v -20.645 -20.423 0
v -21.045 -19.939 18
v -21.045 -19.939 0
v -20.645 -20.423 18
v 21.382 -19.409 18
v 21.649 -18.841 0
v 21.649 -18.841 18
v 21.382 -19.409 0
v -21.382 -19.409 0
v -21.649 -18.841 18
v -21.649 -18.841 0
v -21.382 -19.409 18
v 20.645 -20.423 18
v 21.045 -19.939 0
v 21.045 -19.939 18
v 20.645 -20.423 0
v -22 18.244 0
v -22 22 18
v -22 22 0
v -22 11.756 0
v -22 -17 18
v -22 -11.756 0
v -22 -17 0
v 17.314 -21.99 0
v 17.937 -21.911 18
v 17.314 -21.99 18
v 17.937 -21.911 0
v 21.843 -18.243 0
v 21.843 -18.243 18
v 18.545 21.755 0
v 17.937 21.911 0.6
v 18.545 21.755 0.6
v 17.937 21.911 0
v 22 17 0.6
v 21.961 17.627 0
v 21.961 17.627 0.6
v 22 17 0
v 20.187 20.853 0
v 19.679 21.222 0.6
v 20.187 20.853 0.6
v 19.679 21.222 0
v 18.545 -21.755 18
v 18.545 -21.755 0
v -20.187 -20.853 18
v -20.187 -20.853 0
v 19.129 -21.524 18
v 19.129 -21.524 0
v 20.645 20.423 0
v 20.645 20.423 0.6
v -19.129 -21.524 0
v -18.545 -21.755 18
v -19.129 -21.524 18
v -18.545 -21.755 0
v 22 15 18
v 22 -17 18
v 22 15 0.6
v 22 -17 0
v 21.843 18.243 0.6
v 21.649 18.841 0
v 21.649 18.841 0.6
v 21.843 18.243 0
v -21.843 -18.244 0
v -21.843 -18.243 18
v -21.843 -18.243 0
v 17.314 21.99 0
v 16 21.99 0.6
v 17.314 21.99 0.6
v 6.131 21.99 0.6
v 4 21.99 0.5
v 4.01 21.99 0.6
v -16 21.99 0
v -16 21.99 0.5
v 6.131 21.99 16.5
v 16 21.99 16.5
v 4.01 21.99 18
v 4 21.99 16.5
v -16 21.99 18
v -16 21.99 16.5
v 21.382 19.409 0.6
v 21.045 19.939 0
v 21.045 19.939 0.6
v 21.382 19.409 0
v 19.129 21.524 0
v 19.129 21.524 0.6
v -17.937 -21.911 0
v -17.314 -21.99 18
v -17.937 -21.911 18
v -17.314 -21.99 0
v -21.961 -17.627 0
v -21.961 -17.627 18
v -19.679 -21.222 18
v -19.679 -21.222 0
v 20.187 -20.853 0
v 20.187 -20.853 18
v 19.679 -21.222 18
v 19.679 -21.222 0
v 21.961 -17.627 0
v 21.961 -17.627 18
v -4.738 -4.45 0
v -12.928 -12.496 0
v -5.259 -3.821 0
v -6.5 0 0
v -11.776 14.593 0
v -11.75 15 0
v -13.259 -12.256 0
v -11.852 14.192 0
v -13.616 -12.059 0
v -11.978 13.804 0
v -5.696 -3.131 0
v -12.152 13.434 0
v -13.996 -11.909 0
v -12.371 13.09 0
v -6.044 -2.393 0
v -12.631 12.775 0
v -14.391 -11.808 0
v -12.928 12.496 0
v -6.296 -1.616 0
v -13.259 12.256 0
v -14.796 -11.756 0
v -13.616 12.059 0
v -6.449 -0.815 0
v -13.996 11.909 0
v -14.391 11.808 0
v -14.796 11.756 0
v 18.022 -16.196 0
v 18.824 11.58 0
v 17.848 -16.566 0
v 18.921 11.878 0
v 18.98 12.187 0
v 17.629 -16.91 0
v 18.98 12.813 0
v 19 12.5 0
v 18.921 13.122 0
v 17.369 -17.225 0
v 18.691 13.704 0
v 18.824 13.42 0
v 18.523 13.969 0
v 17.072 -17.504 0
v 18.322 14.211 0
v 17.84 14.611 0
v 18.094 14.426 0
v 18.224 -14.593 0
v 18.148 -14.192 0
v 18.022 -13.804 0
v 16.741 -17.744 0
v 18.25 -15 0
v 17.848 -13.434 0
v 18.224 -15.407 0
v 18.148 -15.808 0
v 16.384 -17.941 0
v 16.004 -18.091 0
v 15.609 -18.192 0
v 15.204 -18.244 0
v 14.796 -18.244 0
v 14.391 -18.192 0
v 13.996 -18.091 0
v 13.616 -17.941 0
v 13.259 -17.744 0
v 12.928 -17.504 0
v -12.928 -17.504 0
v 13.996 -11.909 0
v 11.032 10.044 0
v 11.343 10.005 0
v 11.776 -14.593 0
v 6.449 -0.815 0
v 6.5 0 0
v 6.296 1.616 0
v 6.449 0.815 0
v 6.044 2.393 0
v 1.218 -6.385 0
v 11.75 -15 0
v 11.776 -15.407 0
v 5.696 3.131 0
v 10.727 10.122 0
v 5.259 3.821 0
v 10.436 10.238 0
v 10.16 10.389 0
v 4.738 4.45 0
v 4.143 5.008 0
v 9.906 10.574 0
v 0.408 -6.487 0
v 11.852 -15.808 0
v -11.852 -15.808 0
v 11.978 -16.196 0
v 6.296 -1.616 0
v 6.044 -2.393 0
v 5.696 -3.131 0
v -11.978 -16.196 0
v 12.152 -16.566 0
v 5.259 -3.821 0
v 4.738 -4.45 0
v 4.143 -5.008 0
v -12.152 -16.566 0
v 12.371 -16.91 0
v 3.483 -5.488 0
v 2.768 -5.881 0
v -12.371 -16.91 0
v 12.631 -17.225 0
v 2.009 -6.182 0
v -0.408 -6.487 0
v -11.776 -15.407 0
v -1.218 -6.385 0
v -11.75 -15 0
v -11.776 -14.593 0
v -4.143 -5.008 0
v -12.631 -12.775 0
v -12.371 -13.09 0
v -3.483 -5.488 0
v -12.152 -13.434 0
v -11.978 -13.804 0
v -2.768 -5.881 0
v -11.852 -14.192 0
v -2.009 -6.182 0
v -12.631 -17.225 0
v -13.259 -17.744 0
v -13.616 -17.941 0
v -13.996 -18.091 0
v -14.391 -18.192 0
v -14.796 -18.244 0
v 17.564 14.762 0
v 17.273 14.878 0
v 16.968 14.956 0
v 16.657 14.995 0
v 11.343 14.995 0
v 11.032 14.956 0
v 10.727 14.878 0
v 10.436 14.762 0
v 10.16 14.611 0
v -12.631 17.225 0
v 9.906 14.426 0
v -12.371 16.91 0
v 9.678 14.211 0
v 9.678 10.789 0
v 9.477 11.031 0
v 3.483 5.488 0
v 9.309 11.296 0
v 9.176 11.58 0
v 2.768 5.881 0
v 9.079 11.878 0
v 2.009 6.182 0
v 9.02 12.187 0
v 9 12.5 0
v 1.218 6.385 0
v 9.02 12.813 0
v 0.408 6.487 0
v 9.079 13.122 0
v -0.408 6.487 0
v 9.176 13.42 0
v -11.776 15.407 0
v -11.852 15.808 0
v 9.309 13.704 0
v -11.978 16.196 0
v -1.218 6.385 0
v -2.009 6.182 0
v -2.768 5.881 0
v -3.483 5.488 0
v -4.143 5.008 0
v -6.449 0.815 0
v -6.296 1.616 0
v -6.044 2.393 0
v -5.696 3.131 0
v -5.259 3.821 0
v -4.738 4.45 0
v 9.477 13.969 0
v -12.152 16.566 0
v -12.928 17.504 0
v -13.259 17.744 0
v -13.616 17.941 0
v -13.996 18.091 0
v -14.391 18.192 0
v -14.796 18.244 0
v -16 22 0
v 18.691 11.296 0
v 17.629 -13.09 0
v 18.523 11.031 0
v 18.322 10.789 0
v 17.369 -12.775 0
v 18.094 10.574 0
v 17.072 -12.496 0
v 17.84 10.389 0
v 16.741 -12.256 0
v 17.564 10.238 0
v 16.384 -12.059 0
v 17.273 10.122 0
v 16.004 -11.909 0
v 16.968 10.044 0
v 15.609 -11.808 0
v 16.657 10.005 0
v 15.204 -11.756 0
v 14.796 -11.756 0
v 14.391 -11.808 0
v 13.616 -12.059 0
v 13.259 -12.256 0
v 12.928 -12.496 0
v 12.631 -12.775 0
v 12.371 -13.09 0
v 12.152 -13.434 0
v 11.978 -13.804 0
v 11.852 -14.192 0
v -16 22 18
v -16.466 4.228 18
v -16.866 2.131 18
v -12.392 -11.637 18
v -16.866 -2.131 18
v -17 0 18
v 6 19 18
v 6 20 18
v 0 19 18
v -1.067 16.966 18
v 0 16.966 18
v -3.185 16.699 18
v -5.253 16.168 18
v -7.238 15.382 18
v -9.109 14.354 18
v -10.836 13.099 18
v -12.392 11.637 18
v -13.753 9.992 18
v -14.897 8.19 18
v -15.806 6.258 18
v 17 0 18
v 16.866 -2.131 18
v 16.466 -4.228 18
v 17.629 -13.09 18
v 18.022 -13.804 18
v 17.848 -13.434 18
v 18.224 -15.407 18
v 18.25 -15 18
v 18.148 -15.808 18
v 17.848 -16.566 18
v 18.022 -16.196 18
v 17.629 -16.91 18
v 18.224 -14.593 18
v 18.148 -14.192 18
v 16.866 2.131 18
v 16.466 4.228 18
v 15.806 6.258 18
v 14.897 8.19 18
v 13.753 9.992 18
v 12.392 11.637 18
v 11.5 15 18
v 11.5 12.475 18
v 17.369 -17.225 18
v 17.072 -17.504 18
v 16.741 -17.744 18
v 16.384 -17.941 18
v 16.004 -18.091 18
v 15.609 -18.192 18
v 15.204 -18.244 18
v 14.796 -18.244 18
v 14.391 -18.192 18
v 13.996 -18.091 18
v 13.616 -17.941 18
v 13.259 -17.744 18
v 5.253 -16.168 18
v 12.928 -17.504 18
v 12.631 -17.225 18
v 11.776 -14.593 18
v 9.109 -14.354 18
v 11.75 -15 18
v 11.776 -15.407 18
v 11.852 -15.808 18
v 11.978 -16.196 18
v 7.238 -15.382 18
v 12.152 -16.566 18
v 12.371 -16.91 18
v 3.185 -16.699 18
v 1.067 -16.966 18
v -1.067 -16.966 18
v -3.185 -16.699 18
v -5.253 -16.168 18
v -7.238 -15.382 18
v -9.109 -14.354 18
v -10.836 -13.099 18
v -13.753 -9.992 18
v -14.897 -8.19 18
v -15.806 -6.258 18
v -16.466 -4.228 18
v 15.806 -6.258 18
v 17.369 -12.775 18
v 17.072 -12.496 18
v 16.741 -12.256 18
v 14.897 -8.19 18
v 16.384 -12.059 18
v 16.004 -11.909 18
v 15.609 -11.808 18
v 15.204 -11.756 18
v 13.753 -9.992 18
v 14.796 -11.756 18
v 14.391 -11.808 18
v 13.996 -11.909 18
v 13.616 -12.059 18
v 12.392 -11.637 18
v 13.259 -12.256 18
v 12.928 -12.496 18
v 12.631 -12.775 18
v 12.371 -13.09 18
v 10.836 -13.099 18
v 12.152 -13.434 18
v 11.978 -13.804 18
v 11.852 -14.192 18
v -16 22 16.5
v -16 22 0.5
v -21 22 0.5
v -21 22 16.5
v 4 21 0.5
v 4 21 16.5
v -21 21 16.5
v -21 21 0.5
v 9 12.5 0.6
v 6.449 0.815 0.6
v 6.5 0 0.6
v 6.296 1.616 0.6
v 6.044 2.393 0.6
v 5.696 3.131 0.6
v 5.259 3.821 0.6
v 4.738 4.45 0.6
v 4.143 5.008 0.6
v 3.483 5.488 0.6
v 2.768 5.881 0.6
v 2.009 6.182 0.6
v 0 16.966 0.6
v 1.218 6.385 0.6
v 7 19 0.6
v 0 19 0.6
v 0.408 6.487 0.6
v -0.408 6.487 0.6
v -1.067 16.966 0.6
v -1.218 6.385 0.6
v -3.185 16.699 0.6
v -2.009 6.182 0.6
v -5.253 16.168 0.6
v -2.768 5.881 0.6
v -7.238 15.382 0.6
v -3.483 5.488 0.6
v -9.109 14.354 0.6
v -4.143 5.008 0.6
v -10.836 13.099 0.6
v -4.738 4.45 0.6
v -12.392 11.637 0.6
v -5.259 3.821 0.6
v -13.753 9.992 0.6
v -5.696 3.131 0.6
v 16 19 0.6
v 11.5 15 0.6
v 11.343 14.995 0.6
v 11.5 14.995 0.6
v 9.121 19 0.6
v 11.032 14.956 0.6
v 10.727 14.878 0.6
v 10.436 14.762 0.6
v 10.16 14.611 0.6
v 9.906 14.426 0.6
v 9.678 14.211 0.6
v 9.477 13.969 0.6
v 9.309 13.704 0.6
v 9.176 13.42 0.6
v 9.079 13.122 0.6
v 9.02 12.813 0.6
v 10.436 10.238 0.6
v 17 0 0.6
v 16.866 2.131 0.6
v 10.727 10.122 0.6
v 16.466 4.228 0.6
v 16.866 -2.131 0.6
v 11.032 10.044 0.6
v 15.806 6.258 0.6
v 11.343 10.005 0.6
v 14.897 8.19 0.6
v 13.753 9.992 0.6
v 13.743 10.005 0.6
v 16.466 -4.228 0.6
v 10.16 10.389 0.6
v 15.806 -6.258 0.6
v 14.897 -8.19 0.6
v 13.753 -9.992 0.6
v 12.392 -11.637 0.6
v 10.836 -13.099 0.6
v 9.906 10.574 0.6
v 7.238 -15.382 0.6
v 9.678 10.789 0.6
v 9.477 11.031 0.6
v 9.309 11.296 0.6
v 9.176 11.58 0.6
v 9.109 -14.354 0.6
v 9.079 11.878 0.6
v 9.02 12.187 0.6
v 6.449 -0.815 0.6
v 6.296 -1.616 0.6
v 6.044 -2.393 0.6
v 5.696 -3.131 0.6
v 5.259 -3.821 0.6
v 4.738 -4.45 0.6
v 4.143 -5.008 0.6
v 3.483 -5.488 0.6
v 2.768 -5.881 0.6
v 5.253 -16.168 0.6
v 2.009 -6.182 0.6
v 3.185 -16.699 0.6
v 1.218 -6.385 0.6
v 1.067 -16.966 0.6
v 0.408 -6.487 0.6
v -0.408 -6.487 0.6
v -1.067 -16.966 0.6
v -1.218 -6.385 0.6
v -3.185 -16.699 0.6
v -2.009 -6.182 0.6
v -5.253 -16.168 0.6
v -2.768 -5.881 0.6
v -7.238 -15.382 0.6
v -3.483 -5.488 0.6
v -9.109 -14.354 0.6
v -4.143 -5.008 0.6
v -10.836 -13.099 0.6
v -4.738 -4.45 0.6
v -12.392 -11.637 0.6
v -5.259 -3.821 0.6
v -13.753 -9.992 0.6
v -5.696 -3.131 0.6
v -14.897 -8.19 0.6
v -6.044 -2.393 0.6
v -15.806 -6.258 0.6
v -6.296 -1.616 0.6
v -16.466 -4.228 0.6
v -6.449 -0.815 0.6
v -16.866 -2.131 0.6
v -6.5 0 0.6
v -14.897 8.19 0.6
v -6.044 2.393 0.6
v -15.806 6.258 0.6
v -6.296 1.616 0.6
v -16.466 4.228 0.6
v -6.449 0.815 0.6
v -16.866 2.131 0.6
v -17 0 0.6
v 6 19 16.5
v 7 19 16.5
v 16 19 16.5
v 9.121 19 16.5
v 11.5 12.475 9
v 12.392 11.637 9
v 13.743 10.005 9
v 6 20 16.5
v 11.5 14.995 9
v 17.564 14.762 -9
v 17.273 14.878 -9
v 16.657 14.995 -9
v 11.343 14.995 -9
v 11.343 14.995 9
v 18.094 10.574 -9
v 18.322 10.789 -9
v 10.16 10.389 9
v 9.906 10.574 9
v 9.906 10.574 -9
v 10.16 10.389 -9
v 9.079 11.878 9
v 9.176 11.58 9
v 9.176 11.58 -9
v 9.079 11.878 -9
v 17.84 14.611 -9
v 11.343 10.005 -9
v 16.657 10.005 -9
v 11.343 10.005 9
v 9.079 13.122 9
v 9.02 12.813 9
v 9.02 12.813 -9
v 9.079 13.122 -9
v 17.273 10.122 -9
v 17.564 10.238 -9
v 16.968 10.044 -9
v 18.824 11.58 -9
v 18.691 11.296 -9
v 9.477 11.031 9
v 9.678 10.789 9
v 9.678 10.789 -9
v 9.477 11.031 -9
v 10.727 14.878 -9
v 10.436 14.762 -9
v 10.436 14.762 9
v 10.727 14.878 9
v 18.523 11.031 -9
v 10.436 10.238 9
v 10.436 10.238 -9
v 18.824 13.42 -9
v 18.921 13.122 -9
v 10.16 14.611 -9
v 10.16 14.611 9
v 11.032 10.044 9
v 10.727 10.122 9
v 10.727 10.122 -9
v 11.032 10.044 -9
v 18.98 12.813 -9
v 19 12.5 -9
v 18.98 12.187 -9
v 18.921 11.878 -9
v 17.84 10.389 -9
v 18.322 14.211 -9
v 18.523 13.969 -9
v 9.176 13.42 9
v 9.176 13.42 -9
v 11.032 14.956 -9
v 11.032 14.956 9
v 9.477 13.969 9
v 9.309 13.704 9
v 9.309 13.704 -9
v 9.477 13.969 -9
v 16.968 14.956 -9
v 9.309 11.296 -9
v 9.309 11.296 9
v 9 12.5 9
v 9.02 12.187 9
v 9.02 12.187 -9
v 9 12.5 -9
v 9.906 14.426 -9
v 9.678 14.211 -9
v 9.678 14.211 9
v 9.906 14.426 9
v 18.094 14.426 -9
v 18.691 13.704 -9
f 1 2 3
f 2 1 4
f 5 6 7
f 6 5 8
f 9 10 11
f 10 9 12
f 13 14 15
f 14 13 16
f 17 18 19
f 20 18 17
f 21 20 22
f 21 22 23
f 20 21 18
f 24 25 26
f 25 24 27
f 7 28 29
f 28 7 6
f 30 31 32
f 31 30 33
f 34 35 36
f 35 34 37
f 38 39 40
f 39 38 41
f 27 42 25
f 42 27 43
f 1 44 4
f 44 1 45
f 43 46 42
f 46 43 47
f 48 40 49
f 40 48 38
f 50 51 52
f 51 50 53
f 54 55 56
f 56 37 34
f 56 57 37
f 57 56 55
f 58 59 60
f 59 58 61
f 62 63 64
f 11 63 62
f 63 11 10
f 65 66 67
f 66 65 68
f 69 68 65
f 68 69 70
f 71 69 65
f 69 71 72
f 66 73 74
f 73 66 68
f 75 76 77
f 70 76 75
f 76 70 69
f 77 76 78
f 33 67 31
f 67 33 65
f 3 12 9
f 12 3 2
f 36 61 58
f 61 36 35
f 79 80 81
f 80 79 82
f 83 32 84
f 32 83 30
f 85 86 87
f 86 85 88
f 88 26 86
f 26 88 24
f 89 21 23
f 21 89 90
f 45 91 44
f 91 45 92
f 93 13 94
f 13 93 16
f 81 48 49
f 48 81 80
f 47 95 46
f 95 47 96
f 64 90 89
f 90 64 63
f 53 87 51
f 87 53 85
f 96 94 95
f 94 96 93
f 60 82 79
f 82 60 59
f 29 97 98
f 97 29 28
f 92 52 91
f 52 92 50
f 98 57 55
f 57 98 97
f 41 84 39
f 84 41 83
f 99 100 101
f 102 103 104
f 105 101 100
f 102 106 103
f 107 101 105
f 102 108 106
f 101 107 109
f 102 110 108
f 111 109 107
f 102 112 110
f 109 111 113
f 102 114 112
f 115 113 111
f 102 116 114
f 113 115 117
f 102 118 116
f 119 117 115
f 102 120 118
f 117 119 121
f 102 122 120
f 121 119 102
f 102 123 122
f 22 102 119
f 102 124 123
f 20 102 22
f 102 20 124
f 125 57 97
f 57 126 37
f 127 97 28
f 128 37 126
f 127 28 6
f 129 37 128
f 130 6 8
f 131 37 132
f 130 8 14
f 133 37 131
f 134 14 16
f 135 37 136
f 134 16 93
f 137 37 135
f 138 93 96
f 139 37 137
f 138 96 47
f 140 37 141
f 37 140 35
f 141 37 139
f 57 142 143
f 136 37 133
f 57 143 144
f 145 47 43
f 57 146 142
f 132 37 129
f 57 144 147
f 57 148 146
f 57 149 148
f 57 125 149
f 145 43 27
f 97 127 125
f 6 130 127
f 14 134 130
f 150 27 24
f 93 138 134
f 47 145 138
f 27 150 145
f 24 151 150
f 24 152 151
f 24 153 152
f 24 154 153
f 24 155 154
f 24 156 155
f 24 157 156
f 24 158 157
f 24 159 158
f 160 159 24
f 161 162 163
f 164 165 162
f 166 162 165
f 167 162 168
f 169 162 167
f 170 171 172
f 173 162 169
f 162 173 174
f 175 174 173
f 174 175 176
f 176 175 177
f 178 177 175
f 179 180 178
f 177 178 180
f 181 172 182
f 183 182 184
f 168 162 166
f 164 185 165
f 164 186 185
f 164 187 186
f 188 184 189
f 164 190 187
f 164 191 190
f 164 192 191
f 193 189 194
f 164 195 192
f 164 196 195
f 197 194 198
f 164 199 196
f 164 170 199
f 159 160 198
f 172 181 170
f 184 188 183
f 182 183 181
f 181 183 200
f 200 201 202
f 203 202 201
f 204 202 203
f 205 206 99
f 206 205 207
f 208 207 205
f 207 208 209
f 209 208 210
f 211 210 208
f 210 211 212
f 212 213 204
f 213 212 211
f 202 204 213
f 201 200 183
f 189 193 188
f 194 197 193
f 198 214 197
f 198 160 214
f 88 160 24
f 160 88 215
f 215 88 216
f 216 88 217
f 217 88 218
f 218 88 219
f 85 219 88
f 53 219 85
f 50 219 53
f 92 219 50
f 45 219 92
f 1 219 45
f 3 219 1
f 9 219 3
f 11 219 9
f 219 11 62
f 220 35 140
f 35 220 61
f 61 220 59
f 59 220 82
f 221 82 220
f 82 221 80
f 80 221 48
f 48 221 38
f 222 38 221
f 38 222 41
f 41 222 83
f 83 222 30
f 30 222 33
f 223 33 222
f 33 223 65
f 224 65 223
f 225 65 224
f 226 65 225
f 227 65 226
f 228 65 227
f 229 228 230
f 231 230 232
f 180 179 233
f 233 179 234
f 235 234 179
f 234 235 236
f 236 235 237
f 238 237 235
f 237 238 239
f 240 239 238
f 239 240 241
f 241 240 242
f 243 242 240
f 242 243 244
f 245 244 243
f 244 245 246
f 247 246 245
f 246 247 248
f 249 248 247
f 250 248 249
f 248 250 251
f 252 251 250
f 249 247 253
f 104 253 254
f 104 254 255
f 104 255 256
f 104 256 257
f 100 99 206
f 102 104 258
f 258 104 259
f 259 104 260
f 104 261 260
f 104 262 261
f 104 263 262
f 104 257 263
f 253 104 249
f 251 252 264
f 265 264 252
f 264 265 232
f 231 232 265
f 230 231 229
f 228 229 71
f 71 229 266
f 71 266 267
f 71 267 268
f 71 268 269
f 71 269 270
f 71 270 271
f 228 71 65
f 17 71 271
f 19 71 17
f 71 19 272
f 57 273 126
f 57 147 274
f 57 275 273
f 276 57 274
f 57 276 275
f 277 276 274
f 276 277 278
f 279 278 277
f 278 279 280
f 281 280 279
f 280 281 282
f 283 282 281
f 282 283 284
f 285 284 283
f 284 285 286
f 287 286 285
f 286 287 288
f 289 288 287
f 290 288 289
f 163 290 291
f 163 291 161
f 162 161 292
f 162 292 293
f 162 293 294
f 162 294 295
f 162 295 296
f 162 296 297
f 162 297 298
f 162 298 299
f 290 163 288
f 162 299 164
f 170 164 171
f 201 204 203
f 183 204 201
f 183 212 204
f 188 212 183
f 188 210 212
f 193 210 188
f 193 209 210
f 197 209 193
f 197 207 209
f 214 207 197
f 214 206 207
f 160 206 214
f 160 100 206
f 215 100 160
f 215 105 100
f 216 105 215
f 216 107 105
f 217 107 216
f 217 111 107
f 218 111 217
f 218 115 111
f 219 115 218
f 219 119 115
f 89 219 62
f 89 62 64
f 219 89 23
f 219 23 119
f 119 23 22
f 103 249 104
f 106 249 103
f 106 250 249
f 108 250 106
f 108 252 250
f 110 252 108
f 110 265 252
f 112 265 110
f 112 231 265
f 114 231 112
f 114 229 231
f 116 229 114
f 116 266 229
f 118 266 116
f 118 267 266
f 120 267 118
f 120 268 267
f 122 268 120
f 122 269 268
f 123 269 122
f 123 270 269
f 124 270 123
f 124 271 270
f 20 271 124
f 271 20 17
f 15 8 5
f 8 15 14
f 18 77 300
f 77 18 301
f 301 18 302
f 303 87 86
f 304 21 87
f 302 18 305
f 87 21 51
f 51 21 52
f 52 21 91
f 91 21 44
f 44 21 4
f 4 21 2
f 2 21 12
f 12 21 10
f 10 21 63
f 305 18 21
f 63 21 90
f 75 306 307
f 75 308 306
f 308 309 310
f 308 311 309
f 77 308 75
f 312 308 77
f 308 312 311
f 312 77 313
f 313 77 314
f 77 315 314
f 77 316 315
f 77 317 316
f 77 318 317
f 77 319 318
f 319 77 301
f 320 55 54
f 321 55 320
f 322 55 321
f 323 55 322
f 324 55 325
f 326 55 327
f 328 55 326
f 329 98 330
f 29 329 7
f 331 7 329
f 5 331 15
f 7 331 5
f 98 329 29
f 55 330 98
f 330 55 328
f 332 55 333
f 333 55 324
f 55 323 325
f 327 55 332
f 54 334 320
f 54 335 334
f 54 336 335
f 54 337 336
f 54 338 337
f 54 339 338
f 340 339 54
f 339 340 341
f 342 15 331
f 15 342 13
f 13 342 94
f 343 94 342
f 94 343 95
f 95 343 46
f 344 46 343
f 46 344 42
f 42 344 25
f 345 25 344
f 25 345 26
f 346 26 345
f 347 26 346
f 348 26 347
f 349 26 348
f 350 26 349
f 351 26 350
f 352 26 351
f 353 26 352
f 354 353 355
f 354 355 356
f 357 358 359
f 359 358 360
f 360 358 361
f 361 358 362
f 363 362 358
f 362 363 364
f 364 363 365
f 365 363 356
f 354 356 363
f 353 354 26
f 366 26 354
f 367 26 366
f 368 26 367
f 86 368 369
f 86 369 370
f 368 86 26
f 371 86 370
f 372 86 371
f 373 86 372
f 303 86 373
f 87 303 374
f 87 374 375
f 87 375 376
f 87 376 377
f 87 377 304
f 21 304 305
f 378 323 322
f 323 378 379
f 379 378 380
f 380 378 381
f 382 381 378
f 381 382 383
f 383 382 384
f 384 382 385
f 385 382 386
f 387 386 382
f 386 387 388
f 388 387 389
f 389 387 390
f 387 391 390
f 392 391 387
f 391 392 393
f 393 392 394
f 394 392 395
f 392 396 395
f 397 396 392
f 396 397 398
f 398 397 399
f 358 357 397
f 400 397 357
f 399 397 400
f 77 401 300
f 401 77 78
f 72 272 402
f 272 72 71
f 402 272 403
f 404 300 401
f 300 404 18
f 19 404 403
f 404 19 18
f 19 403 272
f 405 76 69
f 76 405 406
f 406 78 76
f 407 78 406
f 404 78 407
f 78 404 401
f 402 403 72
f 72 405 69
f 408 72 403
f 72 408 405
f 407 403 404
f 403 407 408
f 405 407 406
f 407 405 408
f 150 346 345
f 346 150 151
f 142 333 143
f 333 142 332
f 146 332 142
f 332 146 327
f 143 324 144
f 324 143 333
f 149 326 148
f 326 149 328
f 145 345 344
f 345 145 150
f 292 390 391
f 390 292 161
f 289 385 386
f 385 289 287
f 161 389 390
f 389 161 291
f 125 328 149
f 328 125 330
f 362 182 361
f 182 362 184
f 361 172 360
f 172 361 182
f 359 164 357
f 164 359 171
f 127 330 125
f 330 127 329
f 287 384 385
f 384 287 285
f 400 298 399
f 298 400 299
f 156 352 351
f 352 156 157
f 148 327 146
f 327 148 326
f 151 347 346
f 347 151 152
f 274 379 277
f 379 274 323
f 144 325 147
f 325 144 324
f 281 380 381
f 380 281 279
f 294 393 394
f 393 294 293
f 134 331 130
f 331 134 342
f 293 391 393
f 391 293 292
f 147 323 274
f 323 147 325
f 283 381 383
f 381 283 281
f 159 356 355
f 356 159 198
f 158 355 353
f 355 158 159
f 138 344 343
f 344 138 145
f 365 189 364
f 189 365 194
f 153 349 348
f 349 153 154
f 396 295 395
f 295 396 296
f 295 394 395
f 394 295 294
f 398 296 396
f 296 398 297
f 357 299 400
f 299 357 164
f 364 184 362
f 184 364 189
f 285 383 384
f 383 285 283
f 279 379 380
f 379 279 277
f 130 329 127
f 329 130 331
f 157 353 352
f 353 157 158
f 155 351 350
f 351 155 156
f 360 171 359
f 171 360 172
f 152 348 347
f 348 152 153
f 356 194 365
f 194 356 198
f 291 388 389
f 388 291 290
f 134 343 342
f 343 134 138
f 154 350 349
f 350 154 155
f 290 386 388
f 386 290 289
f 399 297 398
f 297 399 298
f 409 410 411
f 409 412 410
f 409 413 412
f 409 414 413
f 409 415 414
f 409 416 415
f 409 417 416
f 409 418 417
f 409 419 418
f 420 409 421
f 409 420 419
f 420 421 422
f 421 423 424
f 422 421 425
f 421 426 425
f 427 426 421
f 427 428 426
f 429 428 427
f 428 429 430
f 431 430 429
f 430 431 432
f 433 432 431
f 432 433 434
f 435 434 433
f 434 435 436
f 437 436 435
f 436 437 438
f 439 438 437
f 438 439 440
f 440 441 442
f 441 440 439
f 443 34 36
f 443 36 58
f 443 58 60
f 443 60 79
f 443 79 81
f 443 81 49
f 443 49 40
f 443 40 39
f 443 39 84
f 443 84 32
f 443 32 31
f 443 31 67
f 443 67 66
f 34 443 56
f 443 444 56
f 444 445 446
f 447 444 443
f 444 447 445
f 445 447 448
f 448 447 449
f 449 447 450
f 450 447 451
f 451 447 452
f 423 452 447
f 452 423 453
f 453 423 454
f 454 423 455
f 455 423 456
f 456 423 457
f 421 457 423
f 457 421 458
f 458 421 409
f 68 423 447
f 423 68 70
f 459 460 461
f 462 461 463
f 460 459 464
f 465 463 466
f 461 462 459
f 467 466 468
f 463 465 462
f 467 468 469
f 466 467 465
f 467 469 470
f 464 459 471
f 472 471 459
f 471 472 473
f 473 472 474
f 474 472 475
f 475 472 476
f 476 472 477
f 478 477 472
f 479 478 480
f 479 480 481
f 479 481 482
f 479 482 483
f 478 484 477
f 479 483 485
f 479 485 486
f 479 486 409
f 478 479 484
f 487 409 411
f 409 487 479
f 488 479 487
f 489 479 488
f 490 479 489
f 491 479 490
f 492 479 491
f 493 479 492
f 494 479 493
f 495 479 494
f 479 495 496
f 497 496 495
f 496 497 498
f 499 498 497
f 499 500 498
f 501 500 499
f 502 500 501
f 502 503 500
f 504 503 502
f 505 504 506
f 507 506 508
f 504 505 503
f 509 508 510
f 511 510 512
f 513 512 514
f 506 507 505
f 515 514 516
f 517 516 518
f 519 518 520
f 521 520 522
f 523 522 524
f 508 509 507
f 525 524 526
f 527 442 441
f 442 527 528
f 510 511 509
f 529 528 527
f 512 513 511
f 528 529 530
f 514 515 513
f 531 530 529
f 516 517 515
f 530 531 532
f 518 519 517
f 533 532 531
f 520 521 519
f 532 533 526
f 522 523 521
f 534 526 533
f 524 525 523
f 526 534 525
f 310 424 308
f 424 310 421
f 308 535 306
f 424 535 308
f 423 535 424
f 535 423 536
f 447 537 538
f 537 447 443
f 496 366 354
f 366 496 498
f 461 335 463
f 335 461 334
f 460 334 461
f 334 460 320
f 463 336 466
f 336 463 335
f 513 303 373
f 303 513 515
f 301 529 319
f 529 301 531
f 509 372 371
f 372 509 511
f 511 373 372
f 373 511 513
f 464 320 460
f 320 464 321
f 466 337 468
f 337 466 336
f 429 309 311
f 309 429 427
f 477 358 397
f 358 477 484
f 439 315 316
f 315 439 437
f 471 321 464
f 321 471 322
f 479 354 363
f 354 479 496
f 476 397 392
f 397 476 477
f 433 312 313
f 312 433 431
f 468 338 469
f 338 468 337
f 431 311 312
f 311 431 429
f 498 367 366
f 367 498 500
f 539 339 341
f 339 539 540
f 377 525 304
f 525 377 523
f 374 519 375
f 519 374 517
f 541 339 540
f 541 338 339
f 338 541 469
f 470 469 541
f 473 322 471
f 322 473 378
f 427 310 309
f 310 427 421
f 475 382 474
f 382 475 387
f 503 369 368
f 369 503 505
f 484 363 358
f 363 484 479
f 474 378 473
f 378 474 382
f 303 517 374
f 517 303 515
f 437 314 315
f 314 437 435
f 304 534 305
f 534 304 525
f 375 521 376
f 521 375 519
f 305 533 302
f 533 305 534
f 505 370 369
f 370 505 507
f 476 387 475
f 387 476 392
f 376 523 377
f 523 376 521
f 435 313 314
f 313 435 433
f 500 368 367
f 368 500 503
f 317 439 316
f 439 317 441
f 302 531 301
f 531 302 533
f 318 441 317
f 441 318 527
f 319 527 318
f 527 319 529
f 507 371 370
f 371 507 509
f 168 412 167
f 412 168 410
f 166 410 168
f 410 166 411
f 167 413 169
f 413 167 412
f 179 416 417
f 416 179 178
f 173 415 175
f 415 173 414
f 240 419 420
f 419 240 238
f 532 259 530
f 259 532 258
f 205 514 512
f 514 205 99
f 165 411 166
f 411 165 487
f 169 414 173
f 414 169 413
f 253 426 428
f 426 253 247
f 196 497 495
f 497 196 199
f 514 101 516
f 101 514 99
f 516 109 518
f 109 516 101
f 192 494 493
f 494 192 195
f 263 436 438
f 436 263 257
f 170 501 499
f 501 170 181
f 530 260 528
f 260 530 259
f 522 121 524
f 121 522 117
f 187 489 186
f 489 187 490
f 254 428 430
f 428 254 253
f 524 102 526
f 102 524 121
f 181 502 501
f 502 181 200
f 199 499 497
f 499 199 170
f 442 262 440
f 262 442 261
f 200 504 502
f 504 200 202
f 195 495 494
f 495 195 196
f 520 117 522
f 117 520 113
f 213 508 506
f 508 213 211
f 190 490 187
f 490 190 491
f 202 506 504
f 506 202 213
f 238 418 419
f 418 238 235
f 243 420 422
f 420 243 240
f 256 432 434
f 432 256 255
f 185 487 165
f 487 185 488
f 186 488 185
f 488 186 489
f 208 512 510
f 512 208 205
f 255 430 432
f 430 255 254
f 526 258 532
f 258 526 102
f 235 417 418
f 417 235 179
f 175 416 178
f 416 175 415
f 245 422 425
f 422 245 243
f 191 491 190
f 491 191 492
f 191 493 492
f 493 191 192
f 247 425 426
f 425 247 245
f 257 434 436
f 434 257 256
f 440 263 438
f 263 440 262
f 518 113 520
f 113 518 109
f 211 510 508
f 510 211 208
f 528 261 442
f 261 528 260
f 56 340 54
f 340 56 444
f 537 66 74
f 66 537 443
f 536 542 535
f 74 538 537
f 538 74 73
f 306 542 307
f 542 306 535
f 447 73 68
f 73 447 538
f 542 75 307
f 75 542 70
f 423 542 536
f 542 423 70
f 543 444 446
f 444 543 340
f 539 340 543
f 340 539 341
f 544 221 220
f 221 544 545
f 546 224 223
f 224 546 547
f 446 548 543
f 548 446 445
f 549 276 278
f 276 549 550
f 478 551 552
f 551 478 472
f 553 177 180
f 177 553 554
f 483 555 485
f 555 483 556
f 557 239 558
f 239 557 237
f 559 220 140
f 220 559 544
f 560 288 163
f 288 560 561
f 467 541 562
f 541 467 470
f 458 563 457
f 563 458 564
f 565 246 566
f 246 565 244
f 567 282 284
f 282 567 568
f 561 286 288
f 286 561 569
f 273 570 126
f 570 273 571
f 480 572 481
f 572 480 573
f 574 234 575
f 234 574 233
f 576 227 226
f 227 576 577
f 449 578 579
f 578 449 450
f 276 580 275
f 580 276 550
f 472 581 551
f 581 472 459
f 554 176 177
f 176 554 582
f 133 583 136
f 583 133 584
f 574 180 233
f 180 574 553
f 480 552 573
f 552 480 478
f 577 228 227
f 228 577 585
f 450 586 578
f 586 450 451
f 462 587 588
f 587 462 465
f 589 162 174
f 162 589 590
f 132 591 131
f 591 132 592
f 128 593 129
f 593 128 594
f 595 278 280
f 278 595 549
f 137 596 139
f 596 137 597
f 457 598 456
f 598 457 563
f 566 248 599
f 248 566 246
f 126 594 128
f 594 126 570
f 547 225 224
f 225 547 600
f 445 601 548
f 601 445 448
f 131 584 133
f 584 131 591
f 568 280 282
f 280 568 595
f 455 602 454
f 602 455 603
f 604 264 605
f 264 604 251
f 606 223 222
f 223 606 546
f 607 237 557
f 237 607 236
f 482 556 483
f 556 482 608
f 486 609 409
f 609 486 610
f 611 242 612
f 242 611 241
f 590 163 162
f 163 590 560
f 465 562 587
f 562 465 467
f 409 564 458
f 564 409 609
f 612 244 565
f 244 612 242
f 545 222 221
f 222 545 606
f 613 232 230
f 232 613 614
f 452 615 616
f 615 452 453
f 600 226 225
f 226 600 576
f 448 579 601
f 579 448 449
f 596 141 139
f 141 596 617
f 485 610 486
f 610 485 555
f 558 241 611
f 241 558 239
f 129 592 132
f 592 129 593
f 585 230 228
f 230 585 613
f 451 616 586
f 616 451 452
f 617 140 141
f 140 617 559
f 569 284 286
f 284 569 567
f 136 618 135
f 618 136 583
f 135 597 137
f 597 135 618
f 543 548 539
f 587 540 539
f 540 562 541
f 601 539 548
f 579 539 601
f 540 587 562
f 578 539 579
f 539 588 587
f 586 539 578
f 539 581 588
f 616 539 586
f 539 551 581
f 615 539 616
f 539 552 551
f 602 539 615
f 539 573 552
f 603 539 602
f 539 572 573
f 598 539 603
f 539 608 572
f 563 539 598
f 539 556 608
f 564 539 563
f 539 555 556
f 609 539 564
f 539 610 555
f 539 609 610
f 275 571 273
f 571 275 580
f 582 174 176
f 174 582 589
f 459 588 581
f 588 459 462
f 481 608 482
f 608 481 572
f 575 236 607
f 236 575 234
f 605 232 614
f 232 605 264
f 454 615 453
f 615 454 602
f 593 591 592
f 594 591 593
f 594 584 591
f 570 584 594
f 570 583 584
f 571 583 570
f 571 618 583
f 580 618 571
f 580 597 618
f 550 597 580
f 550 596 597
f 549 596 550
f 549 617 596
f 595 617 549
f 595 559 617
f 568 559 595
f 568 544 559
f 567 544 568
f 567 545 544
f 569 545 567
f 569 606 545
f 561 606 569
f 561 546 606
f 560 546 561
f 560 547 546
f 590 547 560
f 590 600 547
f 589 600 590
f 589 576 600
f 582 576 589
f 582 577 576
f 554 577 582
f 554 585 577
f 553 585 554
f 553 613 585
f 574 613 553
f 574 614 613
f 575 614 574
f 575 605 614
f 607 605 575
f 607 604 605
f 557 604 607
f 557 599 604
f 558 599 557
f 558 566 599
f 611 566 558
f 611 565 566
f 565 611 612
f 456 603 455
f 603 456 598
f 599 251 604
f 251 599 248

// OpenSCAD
$fn = 50;


union() {
	difference() {
		union() {
			hull() {
				translate(v = [-17.0000000000, 17.0000000000, 0]) {
					cylinder(h = 18, r = 5);
				}
				translate(v = [17.0000000000, 17.0000000000, 0]) {
					cylinder(h = 18, r = 5);
				}
				translate(v = [-17.0000000000, -17.0000000000, 0]) {
					cylinder(h = 18, r = 5);
				}
				translate(v = [17.0000000000, -17.0000000000, 0]) {
					cylinder(h = 18, r = 5);
				}
			}
			translate(v = [-22.0000000000, 16.0000000000, 0]) {
				cube(size = [6, 6, 18]);
			}
		}
		union() {
			translate(v = [-22.5000000000, -15.0000000000, -250.0000000000]) {
				rotate(a = [0, 0, 0]) {
					difference() {
						union() {
							hull() {
								translate(v = [7.5000000000, 0, 0]) {
									cylinder(h = 250, r = 3.2500000000, r1 = 3.2500000000, r2 = 3.2500000000);
								}
								translate(v = [-7.5000000000, 0, 0]) {
									cylinder(h = 250, r = 3.2500000000, r1 = 3.2500000000, r2 = 3.2500000000);
								}
							}
						}
						union();
					}
				}
			}
			translate(v = [-22.5000000000, 15.0000000000, -250.0000000000]) {
				rotate(a = [0, 0, 0]) {
					difference() {
						union() {
							hull() {
								translate(v = [7.5000000000, 0, 0]) {
									cylinder(h = 250, r = 3.2500000000, r1 = 3.2500000000, r2 = 3.2500000000);
								}
								translate(v = [-7.5000000000, 0, 0]) {
									cylinder(h = 250, r = 3.2500000000, r1 = 3.2500000000, r2 = 3.2500000000);
								}
							}
						}
						union();
					}
				}
			}
			translate(v = [-21.0000000000, 21.0000000000, 0.5000000000]) {
				cube(size = [25, 1, 16]);
			}
			translate(v = [15.0000000000, -15.0000000000, 0]) {
				cylinder(h = 100, r = 3.2500000000);
			}
			translate(v = [0.0000000000, 11.0000000000, 0.6000000000]) {
				cube(size = [11, 8, 20.4000000000]);
			}
			translate(v = [0, 0, 0.6000000000]) {
				cylinder(h = 20.4000000000, r = 17.0000000000);
			}
			translate(v = [0, 0, -9.0000000000]) {
				cylinder(h = 18, r = 6.5000000000);
			}
			translate(v = [0.0000000000, 15.0000000000, 0.6000000000]) {
				cube(size = [22.0000000000, 4, 20.4000000000]);
			}
			translate(v = [16.0000000000, 15.0000000000, 0.6000000000]) {
				cube(size = [6, 7, 20.4000000000]);
			}
			translate(v = [6.0000000000, 15.0000000000, 16.5000000000]) {
				cube(size = [16, 7, 1.5000000000]);
			}
			translate(v = [3.2500000000, 22.7500000000, 0.6000000000]) {
				rotate(a = [0, 0, -45]) {
					cube(size = [7.5000000000, 1.5000000000, 20.4000000000]);
				}
			}
			translate(v = [2.5000000000, 10.0000000000, 0.6000000000]) {
				cube(size = [9.0000000000, 5, 17.4000000000]);
			}
		}
	}
	union() {
		translate(v = [14, 12.5000000000, -9.0000000000]) {
			rotate(a = [0, 0, 0]) {
				difference() {
					union() {
						#hull() {
							#translate(v = [2.5000000000, 0, 0]) {
								cylinder(h = 18, r = 2.5000000000, r1 = 2.5000000000, r2 = 2.5000000000);
							}
							#translate(v = [-2.5000000000, 0, 0]) {
								cylinder(h = 18, r = 2.5000000000, r1 = 2.5000000000, r2 = 2.5000000000);
							}
						}
					}
					union();
				}
			}
		}
	}
}
